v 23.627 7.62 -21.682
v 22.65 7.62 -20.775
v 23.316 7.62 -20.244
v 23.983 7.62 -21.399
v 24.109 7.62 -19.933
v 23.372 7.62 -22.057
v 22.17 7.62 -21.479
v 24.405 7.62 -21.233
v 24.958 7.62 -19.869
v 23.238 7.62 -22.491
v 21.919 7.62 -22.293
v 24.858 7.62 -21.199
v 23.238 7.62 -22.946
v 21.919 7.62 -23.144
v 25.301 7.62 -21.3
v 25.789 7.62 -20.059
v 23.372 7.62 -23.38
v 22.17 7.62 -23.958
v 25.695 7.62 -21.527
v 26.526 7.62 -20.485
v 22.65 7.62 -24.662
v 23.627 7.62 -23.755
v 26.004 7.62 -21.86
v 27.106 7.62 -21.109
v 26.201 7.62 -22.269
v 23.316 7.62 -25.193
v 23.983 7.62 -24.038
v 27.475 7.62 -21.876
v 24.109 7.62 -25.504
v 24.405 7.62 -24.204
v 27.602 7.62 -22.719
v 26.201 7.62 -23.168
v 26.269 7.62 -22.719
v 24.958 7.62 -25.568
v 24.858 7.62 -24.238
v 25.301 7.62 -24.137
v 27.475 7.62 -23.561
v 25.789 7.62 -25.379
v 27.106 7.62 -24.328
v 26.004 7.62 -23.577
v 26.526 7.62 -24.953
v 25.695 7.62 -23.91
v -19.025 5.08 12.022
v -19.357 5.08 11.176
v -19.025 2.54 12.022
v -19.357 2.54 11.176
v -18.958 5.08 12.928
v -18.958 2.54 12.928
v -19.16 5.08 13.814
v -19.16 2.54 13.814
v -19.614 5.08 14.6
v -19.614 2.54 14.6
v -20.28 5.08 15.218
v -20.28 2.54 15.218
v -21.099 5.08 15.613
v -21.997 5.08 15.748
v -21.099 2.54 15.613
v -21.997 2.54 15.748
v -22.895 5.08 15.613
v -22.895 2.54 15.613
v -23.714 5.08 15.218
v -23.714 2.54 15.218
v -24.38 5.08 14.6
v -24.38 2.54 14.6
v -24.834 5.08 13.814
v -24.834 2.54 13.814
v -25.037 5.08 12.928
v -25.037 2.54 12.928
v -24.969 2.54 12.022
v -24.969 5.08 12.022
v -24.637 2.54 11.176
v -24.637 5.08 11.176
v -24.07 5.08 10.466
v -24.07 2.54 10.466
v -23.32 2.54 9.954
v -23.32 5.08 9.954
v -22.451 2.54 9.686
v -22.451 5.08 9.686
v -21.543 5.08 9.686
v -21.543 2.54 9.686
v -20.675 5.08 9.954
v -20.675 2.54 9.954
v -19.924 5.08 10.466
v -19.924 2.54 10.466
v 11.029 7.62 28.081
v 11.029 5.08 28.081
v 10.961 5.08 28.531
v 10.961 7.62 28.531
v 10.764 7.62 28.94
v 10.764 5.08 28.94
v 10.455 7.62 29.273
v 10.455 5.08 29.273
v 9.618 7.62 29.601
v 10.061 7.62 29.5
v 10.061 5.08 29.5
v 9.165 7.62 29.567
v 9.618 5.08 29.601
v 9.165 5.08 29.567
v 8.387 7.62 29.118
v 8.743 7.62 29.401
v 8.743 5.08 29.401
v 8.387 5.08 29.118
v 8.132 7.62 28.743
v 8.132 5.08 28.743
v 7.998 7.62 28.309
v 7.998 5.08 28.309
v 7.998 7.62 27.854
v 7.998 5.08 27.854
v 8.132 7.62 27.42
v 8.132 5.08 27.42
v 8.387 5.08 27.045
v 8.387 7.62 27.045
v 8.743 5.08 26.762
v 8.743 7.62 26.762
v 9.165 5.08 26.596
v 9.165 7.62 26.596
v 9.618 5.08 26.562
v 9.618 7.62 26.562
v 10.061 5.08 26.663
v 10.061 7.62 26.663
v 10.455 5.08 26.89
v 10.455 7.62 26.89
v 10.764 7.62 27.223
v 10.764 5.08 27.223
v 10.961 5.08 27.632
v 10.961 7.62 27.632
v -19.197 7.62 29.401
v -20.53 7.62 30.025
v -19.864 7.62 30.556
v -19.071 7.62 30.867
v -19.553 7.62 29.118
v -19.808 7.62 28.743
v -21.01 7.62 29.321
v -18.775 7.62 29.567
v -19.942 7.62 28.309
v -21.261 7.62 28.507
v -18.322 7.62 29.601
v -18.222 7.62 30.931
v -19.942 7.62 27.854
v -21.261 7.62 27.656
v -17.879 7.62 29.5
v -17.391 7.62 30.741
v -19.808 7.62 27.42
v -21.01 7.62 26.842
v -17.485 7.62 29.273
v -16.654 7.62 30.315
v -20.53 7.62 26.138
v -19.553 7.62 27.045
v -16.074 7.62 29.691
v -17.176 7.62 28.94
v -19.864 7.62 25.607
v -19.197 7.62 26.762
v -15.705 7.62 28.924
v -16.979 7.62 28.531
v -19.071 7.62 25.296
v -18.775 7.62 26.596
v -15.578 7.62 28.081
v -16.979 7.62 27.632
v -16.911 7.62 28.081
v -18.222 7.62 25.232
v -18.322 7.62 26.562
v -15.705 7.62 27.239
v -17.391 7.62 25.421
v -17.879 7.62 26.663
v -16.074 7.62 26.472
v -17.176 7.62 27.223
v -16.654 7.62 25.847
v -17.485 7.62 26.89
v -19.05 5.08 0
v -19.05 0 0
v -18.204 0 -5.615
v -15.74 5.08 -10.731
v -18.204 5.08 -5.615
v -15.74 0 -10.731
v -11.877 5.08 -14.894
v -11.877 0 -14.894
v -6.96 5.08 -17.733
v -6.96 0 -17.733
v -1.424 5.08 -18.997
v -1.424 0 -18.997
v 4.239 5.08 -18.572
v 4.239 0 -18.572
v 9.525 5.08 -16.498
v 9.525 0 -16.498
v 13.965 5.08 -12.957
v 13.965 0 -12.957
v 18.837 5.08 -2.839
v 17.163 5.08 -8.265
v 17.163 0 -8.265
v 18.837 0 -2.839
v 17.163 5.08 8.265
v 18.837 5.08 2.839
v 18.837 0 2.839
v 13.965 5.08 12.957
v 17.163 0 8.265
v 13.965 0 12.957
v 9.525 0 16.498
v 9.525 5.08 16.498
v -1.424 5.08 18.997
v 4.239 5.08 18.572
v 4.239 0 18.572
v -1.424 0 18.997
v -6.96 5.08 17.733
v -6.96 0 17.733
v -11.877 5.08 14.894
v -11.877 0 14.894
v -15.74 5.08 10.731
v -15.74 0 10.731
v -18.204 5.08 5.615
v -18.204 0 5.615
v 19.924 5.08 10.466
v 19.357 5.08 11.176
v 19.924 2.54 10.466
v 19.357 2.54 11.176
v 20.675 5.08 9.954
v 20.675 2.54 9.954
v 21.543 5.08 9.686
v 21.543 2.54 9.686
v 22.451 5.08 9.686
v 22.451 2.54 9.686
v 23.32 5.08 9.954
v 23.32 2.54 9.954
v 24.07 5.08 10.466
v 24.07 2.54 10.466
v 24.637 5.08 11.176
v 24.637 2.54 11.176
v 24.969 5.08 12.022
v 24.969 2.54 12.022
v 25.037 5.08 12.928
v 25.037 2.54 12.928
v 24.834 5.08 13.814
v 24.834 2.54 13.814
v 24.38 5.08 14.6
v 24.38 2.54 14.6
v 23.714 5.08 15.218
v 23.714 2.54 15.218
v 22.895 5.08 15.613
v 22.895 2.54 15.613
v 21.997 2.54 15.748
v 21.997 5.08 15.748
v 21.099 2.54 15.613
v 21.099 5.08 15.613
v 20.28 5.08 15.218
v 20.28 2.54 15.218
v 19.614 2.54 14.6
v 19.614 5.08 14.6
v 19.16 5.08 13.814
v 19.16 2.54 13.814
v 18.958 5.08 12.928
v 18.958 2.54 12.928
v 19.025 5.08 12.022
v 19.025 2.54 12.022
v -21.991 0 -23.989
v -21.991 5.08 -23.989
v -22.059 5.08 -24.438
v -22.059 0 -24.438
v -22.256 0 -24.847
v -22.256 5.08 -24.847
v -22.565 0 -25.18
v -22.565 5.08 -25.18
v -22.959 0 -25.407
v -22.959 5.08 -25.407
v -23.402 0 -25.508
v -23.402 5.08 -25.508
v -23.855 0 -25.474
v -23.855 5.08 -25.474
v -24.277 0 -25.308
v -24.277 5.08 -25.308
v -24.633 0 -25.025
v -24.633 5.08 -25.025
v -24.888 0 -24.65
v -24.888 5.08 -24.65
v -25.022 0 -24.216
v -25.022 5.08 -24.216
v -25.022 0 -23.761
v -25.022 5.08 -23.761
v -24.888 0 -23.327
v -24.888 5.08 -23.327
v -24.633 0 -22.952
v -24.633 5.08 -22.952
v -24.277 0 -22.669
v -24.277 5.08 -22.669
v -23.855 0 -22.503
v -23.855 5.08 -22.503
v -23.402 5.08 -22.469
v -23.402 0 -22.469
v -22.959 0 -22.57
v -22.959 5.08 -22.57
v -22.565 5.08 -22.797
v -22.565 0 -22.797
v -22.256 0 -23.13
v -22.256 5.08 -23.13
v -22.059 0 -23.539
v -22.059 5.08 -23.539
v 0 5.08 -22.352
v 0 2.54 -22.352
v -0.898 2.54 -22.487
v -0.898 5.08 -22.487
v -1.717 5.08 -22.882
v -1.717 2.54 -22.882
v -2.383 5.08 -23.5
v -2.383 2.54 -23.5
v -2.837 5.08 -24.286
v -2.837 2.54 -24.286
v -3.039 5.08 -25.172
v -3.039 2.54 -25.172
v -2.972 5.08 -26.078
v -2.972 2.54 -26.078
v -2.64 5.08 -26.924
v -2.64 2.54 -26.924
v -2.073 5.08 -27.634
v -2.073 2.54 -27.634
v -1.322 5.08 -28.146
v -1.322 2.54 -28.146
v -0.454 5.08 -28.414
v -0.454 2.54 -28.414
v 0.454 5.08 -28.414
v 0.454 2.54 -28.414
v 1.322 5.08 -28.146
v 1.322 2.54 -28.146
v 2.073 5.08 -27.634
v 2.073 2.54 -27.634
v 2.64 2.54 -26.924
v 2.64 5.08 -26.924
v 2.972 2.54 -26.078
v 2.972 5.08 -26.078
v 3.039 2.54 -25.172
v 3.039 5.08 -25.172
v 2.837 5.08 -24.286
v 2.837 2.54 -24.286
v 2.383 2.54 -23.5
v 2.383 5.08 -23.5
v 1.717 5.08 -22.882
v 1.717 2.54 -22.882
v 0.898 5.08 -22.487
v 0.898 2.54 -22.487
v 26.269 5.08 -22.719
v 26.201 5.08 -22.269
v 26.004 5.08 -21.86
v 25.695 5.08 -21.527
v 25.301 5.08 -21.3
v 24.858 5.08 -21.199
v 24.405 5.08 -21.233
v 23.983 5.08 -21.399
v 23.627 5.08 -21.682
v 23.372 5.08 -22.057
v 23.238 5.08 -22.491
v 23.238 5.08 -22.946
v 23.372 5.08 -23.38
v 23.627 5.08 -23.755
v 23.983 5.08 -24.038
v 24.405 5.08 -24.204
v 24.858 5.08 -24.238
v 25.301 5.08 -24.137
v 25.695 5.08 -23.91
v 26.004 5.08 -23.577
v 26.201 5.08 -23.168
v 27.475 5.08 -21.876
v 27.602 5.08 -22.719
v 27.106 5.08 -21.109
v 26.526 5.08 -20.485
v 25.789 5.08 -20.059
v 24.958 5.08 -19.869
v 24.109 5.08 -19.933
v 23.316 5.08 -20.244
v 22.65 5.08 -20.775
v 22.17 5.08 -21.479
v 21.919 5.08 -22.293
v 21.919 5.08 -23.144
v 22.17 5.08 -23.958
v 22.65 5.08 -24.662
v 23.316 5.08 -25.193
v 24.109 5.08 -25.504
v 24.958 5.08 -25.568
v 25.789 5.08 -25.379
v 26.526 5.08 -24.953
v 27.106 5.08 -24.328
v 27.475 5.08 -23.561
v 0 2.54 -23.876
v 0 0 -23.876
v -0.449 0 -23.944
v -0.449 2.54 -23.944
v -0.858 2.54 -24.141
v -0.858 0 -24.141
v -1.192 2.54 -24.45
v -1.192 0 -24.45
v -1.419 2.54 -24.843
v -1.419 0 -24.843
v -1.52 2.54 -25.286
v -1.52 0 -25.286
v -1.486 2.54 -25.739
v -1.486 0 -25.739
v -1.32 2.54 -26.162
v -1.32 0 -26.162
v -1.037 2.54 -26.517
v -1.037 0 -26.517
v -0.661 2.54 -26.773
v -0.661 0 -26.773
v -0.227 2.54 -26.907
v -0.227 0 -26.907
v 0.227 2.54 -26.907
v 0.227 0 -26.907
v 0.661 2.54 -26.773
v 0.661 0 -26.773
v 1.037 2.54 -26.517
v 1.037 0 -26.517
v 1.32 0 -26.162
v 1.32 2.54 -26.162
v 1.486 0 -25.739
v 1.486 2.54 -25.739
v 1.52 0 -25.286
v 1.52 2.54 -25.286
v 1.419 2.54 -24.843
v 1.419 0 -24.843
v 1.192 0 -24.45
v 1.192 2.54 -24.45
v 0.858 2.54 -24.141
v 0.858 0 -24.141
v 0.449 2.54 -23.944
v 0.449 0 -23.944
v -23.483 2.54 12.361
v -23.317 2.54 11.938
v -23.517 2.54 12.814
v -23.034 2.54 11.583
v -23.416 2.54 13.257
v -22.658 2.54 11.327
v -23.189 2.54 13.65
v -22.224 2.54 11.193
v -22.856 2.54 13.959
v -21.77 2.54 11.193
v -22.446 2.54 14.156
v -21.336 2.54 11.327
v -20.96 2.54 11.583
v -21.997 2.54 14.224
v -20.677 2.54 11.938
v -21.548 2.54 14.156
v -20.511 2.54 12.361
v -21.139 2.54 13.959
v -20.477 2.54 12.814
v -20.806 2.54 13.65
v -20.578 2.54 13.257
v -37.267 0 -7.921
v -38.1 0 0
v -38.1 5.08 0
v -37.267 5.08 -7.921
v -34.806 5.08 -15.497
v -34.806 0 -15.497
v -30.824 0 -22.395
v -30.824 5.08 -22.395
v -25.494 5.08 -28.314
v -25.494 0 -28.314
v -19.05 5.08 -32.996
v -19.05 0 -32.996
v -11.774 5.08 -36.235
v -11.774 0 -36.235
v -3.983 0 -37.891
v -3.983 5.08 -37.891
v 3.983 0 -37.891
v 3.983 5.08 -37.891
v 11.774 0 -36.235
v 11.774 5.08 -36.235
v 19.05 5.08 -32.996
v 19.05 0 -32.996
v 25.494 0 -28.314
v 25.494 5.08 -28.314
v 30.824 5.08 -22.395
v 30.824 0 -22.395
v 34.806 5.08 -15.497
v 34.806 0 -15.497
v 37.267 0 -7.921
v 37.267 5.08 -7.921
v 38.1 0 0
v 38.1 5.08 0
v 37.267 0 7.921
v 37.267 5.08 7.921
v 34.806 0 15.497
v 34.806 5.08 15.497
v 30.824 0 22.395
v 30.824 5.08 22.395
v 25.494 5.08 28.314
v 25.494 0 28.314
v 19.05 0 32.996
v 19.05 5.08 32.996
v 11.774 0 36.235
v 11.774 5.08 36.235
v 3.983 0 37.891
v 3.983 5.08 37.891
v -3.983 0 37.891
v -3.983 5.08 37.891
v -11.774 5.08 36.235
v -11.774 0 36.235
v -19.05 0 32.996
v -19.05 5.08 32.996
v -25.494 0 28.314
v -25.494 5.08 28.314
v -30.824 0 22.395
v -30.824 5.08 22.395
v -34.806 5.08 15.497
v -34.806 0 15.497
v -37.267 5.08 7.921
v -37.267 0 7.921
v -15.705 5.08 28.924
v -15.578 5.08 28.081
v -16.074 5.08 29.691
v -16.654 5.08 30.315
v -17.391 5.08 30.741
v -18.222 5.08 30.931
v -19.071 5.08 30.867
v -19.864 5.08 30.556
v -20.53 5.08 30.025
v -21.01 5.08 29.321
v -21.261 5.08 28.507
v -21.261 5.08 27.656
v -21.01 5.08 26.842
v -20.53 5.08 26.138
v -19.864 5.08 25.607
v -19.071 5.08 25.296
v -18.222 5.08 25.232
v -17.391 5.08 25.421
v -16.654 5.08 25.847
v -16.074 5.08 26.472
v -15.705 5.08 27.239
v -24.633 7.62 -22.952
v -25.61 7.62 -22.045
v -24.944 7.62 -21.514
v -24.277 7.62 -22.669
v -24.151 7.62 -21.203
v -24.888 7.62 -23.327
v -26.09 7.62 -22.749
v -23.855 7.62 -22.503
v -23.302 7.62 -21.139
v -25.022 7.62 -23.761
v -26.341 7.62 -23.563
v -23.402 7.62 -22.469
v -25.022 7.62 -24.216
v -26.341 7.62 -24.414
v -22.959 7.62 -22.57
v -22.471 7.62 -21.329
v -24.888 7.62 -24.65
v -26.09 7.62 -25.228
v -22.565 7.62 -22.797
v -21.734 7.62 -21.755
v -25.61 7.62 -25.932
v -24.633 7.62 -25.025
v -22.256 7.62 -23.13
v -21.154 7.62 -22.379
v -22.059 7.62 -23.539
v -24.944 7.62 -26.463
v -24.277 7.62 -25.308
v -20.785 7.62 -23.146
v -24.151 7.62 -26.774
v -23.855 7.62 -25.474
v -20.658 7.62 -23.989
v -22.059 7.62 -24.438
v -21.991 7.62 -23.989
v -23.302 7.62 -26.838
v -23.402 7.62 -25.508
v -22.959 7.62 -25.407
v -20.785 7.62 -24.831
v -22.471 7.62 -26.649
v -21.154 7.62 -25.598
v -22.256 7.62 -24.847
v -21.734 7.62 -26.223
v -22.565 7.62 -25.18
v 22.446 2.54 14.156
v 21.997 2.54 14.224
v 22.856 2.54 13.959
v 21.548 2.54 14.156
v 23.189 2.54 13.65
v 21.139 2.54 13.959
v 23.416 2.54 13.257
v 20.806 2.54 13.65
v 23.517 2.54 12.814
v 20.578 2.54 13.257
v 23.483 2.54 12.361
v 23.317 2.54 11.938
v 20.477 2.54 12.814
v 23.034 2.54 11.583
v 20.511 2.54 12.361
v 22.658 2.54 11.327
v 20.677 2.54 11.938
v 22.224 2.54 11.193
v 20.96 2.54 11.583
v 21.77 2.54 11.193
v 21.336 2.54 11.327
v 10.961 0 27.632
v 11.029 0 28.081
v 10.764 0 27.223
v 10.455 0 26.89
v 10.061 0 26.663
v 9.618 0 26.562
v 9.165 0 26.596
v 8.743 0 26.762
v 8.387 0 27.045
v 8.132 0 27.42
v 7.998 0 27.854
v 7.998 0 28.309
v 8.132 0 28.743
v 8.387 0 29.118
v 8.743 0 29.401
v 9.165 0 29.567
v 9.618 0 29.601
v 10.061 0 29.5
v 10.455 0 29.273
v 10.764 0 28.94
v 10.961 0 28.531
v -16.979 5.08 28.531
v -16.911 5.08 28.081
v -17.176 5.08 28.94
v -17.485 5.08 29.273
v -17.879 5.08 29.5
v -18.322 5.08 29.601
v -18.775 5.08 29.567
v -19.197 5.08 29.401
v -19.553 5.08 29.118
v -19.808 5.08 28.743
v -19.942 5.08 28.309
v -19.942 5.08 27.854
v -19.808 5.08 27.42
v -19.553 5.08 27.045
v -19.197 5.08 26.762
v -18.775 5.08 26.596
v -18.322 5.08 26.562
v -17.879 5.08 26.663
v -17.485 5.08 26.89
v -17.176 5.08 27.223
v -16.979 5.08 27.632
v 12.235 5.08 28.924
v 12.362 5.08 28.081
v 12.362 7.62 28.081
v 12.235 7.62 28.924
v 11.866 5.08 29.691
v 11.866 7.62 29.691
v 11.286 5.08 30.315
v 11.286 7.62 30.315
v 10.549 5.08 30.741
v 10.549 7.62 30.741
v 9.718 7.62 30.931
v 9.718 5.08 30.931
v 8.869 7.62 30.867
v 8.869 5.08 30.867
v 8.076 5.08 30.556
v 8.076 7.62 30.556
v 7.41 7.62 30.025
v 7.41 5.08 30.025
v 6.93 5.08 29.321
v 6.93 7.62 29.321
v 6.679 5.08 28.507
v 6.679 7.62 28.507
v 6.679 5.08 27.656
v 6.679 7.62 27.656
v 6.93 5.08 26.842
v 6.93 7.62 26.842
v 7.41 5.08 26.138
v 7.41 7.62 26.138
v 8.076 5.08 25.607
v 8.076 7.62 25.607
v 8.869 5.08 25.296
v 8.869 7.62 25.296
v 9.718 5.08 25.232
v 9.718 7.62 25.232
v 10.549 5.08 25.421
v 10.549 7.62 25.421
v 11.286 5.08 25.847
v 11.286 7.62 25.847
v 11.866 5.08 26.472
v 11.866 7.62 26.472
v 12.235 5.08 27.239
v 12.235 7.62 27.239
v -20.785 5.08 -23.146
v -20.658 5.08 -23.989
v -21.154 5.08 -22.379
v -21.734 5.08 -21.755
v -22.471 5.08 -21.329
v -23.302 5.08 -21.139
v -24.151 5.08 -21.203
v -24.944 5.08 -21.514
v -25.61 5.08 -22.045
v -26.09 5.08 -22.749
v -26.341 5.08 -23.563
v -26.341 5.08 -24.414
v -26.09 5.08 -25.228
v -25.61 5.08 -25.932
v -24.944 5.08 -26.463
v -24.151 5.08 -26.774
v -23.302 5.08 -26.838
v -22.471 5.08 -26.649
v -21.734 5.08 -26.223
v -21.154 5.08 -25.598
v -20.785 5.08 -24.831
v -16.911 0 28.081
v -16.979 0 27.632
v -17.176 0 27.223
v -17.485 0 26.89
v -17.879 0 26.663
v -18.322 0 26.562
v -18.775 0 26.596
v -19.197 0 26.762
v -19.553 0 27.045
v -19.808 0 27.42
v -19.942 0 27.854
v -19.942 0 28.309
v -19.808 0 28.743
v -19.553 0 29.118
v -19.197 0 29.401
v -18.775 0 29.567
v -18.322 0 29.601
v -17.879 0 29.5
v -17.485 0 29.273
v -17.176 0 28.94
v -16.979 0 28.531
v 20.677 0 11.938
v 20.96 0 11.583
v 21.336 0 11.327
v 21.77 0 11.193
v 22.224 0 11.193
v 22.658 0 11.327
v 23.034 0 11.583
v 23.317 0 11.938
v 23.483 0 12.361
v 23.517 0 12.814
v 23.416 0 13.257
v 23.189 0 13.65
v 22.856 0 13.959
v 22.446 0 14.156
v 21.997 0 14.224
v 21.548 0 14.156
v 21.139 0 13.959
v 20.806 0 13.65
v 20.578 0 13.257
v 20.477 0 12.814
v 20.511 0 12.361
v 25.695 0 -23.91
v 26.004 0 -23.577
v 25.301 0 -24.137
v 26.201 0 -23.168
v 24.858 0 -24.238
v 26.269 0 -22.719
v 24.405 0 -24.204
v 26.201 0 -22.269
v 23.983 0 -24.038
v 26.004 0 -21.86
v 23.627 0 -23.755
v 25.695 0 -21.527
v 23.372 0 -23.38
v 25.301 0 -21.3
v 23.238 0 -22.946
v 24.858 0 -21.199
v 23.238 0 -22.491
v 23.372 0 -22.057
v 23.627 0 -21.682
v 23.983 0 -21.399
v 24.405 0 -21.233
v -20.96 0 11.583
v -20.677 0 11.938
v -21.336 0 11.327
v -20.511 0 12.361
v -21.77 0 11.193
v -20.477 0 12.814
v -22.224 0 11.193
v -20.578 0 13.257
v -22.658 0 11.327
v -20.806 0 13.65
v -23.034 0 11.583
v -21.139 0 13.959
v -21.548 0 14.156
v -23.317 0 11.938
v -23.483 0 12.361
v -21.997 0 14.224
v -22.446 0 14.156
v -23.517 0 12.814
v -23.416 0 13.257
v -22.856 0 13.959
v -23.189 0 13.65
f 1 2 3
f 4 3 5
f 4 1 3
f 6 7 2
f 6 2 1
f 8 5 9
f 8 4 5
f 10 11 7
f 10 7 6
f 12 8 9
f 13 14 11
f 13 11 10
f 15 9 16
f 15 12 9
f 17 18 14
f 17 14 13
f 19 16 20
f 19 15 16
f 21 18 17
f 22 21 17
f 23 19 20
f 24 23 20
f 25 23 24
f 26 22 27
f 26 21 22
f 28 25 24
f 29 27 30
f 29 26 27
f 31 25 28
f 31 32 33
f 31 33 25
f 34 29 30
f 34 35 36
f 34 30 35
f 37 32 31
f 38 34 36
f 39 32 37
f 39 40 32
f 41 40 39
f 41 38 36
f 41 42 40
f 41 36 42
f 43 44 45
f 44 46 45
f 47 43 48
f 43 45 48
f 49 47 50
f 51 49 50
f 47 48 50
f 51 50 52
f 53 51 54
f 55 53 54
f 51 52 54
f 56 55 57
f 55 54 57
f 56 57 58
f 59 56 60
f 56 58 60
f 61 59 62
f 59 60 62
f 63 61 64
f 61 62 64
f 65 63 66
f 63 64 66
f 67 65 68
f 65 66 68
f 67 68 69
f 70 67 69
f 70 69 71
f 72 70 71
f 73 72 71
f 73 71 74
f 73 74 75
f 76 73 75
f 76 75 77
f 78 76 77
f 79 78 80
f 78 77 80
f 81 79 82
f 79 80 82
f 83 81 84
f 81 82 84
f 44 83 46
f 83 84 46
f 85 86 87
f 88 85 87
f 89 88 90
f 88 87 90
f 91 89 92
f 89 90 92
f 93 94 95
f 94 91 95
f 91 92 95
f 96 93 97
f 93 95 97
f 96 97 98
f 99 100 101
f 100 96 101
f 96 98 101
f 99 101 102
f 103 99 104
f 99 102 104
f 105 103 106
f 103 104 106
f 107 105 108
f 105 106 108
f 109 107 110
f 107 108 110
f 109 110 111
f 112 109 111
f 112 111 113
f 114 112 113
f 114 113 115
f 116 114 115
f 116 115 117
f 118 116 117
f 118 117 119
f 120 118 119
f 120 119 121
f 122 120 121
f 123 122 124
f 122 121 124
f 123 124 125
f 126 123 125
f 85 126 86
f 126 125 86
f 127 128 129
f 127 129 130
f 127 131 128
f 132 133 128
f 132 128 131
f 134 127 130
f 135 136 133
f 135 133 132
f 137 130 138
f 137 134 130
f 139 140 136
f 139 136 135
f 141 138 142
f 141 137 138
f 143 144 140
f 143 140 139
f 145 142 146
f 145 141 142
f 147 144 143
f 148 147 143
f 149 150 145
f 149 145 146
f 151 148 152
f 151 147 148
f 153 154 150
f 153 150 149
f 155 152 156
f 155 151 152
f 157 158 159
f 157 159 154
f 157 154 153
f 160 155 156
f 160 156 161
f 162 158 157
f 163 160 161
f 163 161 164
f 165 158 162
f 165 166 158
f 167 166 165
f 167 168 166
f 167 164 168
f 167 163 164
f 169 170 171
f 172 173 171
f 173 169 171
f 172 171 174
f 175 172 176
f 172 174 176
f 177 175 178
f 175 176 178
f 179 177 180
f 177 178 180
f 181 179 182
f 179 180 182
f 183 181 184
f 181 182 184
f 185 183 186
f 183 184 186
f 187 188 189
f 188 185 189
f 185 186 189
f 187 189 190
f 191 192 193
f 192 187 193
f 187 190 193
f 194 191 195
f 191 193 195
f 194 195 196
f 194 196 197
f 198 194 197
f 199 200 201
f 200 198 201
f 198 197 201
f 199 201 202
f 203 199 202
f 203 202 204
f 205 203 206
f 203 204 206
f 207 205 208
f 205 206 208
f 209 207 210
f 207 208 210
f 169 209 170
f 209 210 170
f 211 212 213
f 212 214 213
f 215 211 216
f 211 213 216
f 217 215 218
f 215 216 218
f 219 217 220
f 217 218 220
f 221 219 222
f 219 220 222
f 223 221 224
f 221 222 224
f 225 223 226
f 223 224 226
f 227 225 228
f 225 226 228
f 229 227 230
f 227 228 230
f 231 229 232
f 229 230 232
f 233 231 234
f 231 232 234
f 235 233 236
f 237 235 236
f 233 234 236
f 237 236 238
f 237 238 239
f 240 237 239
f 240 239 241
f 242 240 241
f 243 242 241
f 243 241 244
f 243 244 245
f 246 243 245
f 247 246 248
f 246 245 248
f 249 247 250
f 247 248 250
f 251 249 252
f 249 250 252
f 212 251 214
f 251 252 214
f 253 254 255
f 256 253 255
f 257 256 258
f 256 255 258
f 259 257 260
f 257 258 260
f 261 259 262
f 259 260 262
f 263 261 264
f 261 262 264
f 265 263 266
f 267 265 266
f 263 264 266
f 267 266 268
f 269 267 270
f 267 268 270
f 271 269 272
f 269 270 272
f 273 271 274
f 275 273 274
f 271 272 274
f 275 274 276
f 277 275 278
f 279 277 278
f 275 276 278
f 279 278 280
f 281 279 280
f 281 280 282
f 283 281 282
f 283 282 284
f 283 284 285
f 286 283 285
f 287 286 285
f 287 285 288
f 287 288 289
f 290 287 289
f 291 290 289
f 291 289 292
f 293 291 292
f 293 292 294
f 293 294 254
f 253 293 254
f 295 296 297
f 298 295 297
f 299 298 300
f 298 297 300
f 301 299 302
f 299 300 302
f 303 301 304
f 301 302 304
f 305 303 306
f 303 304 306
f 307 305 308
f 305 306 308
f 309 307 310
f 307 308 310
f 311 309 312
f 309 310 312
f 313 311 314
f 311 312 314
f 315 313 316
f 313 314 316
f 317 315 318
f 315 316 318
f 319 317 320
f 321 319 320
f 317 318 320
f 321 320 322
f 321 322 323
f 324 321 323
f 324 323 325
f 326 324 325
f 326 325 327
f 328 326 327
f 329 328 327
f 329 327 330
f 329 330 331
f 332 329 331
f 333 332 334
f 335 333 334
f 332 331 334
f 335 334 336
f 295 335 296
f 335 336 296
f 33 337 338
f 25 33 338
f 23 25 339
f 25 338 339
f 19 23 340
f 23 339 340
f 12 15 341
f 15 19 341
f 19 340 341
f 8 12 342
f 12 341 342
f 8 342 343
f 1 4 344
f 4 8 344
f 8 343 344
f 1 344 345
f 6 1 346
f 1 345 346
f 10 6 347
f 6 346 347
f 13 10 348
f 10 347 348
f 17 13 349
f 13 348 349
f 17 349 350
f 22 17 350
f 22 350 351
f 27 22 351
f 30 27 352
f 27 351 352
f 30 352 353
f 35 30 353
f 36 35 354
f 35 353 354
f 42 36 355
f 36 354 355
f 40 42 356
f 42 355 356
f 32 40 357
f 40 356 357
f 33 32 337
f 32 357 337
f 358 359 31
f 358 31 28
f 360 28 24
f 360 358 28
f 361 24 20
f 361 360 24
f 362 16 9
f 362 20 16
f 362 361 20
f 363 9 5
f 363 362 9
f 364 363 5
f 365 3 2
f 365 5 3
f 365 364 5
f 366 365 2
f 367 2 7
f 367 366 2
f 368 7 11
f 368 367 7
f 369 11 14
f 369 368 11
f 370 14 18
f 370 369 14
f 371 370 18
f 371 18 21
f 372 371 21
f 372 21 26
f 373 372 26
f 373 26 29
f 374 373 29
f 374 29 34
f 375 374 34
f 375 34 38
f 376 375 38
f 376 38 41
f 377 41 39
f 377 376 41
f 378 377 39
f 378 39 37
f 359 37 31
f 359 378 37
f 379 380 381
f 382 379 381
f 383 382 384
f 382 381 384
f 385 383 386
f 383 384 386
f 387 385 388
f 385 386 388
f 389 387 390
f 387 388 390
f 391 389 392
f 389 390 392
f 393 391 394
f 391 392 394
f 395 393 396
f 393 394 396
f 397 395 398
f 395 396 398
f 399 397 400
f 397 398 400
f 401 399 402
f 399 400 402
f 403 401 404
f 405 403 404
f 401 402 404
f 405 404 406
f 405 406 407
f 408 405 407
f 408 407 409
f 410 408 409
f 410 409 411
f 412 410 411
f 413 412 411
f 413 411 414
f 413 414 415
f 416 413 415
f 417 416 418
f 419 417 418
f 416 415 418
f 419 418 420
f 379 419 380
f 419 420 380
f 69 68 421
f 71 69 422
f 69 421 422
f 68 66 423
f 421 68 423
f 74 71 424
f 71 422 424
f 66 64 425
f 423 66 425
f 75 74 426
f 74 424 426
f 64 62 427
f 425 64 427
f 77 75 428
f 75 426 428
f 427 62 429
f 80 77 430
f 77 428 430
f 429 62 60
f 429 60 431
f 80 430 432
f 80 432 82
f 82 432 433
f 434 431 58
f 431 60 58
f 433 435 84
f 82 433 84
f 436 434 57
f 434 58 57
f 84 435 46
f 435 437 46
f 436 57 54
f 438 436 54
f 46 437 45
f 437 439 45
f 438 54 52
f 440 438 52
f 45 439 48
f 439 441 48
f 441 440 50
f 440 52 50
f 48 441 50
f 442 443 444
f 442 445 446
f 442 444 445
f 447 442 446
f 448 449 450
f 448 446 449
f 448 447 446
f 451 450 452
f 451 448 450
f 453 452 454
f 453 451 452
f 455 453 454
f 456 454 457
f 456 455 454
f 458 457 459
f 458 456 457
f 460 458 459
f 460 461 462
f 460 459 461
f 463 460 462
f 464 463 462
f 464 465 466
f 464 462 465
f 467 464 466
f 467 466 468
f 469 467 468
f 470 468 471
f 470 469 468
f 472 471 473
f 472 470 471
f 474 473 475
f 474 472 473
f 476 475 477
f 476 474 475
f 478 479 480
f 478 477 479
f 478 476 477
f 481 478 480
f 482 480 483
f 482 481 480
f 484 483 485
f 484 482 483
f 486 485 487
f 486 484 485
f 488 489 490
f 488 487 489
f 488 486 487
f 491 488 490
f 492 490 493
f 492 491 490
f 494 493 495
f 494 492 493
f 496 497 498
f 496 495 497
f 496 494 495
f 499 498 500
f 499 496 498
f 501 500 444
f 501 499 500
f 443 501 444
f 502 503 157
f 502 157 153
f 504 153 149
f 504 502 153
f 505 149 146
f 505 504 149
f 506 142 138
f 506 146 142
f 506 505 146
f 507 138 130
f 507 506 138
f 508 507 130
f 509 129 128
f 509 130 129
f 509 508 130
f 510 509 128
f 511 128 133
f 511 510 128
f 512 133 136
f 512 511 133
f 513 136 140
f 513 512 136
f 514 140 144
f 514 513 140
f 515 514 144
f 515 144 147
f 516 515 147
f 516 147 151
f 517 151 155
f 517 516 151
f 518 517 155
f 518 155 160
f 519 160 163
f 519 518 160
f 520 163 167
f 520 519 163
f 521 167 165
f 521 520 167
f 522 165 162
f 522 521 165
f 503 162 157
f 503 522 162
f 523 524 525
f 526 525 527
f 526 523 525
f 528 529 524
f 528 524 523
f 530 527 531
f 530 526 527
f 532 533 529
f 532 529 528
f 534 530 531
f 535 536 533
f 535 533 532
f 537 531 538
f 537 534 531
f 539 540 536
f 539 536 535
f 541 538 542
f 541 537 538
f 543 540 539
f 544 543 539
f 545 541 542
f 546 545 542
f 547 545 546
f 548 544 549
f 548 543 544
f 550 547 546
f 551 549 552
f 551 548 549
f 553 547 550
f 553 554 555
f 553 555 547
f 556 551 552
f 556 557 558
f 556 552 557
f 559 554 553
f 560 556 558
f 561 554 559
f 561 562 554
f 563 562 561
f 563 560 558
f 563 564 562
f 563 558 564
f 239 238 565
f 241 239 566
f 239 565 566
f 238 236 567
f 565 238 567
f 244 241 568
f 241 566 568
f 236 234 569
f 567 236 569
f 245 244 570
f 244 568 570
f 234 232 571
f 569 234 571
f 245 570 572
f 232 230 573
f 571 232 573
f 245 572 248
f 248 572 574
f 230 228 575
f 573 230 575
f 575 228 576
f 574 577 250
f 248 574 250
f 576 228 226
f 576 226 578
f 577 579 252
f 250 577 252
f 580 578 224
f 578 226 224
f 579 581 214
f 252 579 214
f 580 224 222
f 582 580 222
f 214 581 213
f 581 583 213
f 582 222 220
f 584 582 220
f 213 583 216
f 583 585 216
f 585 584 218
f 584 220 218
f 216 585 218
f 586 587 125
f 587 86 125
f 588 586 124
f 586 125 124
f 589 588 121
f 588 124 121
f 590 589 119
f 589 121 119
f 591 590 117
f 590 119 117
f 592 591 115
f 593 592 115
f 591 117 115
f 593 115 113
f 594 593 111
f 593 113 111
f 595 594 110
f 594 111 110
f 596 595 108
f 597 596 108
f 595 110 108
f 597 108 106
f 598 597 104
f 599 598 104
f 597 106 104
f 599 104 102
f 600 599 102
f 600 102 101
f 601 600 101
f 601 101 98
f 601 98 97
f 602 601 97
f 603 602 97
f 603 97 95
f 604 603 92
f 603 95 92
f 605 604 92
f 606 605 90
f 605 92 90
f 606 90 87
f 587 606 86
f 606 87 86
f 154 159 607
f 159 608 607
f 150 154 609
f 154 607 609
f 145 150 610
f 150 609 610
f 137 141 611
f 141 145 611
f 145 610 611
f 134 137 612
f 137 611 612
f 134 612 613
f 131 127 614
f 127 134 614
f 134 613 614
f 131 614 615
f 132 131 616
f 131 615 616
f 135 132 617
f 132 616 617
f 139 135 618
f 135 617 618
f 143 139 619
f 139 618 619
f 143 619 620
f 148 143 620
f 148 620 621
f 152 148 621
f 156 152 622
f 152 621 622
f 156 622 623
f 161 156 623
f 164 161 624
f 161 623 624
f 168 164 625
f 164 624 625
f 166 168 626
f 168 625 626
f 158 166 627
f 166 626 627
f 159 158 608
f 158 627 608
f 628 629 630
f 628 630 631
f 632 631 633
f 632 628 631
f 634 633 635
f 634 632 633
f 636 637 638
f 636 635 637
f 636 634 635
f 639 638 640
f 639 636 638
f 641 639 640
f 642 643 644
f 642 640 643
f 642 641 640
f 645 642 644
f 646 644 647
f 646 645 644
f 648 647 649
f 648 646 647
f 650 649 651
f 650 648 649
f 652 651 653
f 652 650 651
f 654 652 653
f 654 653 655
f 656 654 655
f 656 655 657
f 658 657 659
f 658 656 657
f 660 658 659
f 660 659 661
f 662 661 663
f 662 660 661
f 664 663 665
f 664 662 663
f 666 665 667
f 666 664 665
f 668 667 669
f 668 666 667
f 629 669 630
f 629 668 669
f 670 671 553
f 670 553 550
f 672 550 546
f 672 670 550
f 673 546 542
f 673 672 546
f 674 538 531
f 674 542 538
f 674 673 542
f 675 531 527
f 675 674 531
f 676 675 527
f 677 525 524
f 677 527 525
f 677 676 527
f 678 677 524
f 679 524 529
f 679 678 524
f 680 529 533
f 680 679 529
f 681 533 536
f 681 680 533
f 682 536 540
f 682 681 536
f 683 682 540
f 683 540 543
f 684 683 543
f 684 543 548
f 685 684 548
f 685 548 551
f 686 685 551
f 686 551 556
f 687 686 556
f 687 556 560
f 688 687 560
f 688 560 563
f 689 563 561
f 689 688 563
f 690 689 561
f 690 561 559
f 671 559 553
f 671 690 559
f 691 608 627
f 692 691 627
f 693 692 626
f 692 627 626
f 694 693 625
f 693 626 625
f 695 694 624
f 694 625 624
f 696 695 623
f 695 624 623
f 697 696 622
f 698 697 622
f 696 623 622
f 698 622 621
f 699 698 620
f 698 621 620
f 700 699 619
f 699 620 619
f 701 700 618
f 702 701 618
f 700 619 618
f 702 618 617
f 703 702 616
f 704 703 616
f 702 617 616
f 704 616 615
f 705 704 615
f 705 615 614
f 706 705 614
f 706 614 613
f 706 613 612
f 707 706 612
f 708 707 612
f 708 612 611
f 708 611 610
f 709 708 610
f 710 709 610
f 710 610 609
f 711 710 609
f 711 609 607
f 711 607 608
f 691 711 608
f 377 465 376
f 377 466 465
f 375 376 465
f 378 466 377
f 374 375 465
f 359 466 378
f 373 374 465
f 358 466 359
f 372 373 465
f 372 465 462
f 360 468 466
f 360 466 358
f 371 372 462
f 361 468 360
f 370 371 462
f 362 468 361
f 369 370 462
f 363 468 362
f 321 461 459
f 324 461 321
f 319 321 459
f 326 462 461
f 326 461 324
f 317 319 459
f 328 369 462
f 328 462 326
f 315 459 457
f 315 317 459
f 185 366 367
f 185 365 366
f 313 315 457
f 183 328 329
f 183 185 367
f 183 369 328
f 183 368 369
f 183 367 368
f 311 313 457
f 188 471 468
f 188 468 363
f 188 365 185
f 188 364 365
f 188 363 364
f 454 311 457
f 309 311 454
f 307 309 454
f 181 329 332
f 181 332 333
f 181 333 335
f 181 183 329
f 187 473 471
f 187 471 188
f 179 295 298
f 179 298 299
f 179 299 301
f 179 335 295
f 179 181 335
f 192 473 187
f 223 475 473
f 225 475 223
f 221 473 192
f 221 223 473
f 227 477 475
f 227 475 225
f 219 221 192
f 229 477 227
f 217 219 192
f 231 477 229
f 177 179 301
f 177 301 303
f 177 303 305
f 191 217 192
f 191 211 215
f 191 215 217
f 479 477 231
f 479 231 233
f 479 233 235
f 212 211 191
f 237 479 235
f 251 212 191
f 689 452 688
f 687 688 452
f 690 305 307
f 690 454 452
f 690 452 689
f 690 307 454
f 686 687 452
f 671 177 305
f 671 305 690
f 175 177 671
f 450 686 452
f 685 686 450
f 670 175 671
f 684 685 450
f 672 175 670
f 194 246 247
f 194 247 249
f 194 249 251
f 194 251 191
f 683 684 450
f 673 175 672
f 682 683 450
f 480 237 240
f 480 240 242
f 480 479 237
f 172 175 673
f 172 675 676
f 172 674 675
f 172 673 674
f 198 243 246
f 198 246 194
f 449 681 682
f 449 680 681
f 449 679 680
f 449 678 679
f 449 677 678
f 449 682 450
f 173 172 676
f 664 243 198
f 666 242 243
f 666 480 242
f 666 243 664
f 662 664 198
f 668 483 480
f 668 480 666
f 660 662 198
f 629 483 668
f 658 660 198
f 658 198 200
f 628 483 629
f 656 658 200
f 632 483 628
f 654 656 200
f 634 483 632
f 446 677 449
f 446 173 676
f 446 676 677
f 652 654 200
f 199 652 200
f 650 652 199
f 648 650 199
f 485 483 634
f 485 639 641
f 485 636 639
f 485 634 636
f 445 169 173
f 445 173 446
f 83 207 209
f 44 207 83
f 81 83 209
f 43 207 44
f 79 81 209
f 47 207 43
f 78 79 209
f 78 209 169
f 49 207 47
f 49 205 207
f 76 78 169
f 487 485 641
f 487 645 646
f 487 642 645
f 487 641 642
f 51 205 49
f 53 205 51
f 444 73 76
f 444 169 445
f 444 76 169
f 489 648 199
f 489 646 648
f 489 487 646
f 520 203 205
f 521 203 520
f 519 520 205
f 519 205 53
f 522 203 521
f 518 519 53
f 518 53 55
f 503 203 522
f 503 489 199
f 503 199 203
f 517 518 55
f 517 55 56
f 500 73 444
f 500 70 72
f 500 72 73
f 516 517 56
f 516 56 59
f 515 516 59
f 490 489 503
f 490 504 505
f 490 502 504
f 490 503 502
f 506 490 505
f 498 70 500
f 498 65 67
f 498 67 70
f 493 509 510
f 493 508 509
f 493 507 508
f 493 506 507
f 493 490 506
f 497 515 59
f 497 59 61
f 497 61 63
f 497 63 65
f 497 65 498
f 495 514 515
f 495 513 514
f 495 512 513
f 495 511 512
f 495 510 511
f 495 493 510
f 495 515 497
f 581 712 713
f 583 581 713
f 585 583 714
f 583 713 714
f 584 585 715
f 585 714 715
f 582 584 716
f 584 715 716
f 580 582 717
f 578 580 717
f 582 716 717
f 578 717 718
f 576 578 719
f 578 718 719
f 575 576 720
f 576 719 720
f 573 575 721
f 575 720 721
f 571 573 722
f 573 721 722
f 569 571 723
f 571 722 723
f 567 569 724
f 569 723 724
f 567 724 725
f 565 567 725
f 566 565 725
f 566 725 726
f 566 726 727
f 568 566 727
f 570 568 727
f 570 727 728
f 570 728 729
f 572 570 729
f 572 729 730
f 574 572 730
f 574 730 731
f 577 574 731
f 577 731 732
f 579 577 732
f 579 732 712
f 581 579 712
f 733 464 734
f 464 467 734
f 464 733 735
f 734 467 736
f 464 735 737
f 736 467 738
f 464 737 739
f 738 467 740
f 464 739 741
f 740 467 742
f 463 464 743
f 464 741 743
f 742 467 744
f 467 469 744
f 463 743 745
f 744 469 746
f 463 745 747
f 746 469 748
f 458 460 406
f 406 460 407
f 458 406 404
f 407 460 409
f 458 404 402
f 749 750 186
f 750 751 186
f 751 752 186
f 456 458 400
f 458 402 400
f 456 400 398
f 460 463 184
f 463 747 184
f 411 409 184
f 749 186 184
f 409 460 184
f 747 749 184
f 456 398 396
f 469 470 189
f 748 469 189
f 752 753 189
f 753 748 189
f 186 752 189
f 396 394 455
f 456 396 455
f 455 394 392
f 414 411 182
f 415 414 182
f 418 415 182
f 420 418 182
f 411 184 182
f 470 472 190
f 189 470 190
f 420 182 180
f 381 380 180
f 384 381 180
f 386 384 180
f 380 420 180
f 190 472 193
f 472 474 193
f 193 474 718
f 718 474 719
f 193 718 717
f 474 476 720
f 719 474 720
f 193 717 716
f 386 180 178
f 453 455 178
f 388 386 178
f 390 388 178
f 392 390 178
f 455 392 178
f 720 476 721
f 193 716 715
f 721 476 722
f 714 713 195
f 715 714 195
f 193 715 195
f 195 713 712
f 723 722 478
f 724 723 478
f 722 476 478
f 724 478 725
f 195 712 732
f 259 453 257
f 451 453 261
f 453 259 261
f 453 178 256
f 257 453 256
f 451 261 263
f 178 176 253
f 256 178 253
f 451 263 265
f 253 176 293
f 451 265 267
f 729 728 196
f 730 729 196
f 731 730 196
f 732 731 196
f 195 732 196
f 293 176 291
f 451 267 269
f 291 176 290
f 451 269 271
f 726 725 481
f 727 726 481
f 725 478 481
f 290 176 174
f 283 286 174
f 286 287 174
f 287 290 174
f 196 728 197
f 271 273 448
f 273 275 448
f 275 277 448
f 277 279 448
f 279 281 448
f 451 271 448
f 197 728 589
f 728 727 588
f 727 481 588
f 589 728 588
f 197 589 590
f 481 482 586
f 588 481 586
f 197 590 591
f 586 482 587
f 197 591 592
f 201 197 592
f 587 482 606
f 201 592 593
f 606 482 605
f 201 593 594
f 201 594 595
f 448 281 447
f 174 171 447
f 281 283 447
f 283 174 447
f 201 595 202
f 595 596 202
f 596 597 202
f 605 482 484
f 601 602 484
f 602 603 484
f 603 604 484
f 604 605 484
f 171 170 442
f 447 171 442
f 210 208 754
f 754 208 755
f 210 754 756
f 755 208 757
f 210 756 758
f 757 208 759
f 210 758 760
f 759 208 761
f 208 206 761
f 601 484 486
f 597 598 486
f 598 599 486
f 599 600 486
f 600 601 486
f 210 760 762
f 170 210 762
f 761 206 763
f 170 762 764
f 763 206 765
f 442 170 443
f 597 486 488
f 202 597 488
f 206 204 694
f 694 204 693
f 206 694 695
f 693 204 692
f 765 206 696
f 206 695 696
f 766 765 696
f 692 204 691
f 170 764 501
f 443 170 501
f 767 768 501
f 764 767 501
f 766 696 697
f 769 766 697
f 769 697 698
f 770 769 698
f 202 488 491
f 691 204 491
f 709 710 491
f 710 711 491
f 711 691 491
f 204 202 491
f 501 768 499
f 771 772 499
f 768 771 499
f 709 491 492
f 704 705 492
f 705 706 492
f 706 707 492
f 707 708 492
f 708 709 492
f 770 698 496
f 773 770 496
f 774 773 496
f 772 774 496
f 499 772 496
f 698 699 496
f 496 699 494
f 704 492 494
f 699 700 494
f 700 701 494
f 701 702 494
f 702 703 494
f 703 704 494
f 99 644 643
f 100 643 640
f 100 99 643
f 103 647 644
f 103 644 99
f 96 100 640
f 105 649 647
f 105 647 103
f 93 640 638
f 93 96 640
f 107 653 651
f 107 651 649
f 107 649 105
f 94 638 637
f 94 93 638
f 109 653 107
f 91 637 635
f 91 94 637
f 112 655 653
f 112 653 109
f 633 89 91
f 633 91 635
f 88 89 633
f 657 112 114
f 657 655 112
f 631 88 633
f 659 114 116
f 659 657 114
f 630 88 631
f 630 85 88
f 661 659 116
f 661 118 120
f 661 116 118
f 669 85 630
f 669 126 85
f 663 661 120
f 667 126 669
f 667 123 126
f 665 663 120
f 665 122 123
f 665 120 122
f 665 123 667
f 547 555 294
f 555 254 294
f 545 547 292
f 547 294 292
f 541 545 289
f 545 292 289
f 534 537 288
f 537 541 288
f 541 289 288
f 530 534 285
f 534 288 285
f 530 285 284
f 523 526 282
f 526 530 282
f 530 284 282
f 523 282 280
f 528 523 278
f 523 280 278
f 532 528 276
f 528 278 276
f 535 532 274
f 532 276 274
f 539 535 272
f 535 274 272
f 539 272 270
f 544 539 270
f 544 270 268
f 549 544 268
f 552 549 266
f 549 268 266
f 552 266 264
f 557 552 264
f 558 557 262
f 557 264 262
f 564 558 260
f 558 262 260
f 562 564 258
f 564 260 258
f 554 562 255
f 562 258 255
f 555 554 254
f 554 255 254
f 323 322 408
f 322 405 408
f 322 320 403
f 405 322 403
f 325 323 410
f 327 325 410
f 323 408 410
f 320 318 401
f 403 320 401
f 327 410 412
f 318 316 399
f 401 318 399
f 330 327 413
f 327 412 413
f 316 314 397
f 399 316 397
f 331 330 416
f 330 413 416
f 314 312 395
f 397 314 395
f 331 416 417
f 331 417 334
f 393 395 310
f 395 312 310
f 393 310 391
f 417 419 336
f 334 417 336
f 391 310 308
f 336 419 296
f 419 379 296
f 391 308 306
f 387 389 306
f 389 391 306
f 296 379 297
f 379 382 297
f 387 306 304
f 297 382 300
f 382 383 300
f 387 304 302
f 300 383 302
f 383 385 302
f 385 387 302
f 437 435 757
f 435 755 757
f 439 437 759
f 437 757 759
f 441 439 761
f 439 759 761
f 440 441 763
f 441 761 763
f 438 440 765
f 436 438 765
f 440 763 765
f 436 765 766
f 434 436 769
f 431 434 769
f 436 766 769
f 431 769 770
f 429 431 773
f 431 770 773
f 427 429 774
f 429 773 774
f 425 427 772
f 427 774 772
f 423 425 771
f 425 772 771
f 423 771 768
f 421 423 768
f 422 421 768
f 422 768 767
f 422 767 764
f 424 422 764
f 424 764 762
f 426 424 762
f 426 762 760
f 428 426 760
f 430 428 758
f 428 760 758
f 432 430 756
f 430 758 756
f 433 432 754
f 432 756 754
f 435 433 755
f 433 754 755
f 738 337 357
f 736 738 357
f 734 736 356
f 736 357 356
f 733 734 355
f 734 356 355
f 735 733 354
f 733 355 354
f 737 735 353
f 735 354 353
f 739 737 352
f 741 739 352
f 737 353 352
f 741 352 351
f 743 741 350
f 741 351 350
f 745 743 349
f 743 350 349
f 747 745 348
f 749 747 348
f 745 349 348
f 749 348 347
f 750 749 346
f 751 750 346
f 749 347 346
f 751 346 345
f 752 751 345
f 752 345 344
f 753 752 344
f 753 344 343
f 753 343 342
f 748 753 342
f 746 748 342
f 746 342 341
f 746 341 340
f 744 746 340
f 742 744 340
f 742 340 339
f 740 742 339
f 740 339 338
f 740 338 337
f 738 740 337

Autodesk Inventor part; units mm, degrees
ref_plane "YZ Plane" through (0, 0, 0) normal (1, 0, 0) x (0, 1, 0)
ref_plane "XZ Plane" through (0, 0, 0) normal (0, 1, 0) x (-1, 0, 0)
ref_plane "XY Plane" through (0, 0, 0) normal (0, 0, 1) x (1, 0, 0)
sketch "Sketch1" plane through (0, 0, 0) normal (0, 1, 0) x (-1, 0, 0)
  circle A0 centre (0, 0) radius 38.1
  circle A1 centre (0, 0) radius 19.05
  circle A2 centre (0, 0) radius 25.4 construction
  dimension "d0" = 50.8
  dimension "d1" = 6.35
  dimension "d5" = 76.2
extrude "Extrusion1" add sketch "Sketch1" along normal blind 5.08
sketch "Sketch2" plane through (0, 5.08, 0) normal (0, 1, 0) x (1, 0, 0)
  circle A0 centre (0, 0) radius 19.05 projected
  point P0 (0, 25.4)
  dimension "d6" = 25.4
hole "Hole1" at (0, 5.08, -25.4) direction (0, -1, 0) diameter 3.048 end through all counterbore diameter 6.096 counterbore depth 2.54
pattern_circular "Circular Pattern1" count 3 over 360 about axis through (0, 0, 0) along (0, 1, 0) of "Hole1"
sketch "Sketch4" plane through (0, 5.08, 0) normal (0, 1, 0) x (1, 0, 0)
  circle A0 centre (0, 0) radius 19.05 projected
  circle A1 centre (24.7446, 22.7186) radius 1.524
  circle A2 centre (-23.5154, 23.9886) radius 1.524
  circle A3 centre (-18.4354, -28.0814) radius 1.524
  circle A4 centre (9.5046, -28.0814) radius 1.524
  dimension "d17" = 3.048
  dimension "d18" = 27.94
  dimension "d19" = 15.24
  dimension "d20" = 5.08
  dimension "d21" = 50.8
  dimension "d22" = 1.27
  dimension "d23" = 33.5921
  dimension "d24" = 33.5921
  dimension "d25" = 33.5921
extrude "Extrusion2" cut sketch "Sketch4" against normal through all contours A1 | A2 | A3 | A4
sketch "Sketch5" plane through (0, 5.08, 0) normal (0, 1, 0) x (1, 0, 0)
  circle A0 centre (-18.4354, -28.0814) radius 1.524 projected
  circle A1 centre (24.7446, 22.7186) radius 1.524 projected
  circle A2 centre (-23.5154, 23.9886) radius 1.524 projected
  circle A3 centre (9.5046, -28.0814) radius 1.524 projected
  circle A4 centre (-23.5154, 23.9886) radius 2.8575
  circle A5 centre (24.7446, 22.7186) radius 2.8575
  circle A6 centre (9.5046, -28.0814) radius 2.8575
  circle A7 centre (-18.4354, -28.0814) radius 2.8575
  dimension "d28" = 5.715
extrude "Extrusion3" add sketch "Sketch5" along normal blind 2.54
equation "\"d23\" = d25"
equation "\"d24\" = d25"
properties part number "Arduino Mount"
